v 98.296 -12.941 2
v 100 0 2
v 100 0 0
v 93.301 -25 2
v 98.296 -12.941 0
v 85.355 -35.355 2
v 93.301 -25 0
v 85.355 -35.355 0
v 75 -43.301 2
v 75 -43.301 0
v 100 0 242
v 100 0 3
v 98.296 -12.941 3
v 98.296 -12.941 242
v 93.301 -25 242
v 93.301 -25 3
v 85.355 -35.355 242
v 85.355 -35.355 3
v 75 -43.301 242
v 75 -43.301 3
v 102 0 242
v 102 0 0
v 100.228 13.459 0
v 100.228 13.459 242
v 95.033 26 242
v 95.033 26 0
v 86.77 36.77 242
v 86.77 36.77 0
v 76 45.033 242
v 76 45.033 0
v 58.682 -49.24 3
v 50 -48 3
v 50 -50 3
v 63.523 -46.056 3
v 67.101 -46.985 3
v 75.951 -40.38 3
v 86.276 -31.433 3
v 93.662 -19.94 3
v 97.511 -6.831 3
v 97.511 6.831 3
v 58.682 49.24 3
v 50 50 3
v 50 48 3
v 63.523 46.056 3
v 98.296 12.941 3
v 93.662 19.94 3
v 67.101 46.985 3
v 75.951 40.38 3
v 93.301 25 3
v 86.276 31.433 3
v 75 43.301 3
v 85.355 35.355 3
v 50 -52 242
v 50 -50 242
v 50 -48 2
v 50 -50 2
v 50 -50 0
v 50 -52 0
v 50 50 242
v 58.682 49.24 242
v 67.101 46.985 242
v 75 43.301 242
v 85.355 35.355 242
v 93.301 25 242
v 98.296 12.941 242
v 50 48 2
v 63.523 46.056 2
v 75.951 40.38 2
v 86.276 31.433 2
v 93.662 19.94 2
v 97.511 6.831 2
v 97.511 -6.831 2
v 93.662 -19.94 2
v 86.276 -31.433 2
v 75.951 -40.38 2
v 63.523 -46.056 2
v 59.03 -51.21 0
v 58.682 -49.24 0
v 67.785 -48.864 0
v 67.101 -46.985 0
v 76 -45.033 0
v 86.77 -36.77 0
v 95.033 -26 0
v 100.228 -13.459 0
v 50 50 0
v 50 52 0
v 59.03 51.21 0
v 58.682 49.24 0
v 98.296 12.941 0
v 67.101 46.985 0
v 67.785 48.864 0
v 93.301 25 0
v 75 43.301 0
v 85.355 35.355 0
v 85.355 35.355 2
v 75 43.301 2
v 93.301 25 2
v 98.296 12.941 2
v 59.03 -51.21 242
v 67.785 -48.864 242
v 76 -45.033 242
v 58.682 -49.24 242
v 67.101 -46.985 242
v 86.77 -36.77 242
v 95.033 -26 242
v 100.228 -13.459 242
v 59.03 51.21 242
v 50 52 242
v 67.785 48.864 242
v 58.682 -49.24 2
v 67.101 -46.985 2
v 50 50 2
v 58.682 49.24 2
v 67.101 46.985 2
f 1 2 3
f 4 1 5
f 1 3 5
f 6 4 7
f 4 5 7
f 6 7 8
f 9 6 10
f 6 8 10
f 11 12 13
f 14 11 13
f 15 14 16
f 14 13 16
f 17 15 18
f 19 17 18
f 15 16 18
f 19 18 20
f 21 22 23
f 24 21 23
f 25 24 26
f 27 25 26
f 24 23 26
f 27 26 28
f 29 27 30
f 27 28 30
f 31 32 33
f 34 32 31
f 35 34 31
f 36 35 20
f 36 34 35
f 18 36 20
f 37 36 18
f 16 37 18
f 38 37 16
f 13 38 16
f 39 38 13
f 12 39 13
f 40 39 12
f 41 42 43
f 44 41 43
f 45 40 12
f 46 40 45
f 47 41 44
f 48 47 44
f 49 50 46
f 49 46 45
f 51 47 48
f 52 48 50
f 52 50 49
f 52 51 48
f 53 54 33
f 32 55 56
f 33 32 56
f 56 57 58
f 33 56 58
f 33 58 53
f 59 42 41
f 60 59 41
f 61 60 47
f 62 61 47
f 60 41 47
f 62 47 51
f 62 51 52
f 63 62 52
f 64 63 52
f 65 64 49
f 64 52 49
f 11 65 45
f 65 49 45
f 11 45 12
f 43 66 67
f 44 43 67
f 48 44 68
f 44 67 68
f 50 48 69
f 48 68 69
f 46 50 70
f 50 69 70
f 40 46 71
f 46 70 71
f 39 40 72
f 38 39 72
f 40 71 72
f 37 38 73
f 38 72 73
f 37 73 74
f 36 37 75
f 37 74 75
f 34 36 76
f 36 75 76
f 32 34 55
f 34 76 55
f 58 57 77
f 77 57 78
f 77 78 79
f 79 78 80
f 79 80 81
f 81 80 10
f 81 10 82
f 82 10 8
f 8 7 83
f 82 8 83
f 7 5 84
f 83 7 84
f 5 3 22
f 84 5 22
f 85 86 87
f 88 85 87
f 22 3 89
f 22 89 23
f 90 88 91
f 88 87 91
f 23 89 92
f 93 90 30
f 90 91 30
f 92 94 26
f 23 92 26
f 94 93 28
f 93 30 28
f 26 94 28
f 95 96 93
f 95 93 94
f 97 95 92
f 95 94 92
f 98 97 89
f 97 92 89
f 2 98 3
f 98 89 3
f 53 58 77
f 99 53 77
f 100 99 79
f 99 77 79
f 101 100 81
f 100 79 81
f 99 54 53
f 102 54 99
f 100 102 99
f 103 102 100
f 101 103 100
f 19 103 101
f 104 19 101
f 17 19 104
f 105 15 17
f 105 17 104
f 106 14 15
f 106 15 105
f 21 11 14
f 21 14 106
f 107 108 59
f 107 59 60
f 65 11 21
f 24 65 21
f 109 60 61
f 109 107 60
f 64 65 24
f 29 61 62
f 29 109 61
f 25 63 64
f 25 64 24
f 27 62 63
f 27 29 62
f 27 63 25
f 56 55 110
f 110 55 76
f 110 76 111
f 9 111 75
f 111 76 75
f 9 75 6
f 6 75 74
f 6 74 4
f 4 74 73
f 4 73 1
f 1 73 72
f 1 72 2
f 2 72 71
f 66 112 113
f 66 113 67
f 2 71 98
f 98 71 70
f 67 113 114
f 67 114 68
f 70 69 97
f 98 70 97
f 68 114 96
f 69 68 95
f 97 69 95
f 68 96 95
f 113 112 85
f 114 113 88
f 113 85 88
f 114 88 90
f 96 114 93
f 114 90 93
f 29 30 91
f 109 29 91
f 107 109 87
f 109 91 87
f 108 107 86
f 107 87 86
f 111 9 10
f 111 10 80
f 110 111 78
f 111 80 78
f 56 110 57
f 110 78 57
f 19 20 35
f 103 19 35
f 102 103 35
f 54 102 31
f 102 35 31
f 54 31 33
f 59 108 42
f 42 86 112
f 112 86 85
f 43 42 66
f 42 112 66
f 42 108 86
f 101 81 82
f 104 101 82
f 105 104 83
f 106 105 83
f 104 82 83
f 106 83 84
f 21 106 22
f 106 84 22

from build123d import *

# Parameters (mm, degrees)
EXTRUDE_1_DEPTH = 242
EXTRUDE_3_DEPTH = 1


with BuildPart() as part:
    # 草图1 → 凸台-拉伸1 (new body)
    with BuildSketch(Plane.XY):
        with BuildLine():
            Line((50, 52), (50, 50))
            ThreePointArc((50, 50), (62.940952255, 48.296291314), (75, 43.301270189))
            ThreePointArc((75, 43.301270189), (93.301270189, 25), (100, 0))
            ThreePointArc((100, 0), (93.301270189, -25), (75, -43.301270189))
            ThreePointArc((75, -43.301270189), (62.940952255, -48.296291314), (50, -50))
            Line((50, -50), (50, -52))
            ThreePointArc((50, -52), (63.458590345, -50.228142967), (76, -45.033320997))
            ThreePointArc((76, -45.033320997), (95.033320997, -26), (102, 0))
            ThreePointArc((102, 0), (95.033320997, 26), (76, 45.033320997))
            ThreePointArc((76, 45.033320997), (63.458590345, 50.228142967), (50, 52))
        make_face()
    extrude(amount=EXTRUDE_1_DEPTH)

    # 草图4 → 凸台-拉伸3 (add)
    with BuildSketch(Plane(origin=(0, 0, 2), x_dir=(-1, 0, 0), z_dir=(0, 0, -1))):
        with BuildLine():
            Line((-50, 50), (-50, 48))
            ThreePointArc((-50, 48), (-98, 0), (-50, -48))
            Line((-50, -48), (-50, -50))
            ThreePointArc((-50, -50), (-100, 0), (-50, 50))
        make_face()
    extrude(amount=-EXTRUDE_3_DEPTH)


solid = part.part
